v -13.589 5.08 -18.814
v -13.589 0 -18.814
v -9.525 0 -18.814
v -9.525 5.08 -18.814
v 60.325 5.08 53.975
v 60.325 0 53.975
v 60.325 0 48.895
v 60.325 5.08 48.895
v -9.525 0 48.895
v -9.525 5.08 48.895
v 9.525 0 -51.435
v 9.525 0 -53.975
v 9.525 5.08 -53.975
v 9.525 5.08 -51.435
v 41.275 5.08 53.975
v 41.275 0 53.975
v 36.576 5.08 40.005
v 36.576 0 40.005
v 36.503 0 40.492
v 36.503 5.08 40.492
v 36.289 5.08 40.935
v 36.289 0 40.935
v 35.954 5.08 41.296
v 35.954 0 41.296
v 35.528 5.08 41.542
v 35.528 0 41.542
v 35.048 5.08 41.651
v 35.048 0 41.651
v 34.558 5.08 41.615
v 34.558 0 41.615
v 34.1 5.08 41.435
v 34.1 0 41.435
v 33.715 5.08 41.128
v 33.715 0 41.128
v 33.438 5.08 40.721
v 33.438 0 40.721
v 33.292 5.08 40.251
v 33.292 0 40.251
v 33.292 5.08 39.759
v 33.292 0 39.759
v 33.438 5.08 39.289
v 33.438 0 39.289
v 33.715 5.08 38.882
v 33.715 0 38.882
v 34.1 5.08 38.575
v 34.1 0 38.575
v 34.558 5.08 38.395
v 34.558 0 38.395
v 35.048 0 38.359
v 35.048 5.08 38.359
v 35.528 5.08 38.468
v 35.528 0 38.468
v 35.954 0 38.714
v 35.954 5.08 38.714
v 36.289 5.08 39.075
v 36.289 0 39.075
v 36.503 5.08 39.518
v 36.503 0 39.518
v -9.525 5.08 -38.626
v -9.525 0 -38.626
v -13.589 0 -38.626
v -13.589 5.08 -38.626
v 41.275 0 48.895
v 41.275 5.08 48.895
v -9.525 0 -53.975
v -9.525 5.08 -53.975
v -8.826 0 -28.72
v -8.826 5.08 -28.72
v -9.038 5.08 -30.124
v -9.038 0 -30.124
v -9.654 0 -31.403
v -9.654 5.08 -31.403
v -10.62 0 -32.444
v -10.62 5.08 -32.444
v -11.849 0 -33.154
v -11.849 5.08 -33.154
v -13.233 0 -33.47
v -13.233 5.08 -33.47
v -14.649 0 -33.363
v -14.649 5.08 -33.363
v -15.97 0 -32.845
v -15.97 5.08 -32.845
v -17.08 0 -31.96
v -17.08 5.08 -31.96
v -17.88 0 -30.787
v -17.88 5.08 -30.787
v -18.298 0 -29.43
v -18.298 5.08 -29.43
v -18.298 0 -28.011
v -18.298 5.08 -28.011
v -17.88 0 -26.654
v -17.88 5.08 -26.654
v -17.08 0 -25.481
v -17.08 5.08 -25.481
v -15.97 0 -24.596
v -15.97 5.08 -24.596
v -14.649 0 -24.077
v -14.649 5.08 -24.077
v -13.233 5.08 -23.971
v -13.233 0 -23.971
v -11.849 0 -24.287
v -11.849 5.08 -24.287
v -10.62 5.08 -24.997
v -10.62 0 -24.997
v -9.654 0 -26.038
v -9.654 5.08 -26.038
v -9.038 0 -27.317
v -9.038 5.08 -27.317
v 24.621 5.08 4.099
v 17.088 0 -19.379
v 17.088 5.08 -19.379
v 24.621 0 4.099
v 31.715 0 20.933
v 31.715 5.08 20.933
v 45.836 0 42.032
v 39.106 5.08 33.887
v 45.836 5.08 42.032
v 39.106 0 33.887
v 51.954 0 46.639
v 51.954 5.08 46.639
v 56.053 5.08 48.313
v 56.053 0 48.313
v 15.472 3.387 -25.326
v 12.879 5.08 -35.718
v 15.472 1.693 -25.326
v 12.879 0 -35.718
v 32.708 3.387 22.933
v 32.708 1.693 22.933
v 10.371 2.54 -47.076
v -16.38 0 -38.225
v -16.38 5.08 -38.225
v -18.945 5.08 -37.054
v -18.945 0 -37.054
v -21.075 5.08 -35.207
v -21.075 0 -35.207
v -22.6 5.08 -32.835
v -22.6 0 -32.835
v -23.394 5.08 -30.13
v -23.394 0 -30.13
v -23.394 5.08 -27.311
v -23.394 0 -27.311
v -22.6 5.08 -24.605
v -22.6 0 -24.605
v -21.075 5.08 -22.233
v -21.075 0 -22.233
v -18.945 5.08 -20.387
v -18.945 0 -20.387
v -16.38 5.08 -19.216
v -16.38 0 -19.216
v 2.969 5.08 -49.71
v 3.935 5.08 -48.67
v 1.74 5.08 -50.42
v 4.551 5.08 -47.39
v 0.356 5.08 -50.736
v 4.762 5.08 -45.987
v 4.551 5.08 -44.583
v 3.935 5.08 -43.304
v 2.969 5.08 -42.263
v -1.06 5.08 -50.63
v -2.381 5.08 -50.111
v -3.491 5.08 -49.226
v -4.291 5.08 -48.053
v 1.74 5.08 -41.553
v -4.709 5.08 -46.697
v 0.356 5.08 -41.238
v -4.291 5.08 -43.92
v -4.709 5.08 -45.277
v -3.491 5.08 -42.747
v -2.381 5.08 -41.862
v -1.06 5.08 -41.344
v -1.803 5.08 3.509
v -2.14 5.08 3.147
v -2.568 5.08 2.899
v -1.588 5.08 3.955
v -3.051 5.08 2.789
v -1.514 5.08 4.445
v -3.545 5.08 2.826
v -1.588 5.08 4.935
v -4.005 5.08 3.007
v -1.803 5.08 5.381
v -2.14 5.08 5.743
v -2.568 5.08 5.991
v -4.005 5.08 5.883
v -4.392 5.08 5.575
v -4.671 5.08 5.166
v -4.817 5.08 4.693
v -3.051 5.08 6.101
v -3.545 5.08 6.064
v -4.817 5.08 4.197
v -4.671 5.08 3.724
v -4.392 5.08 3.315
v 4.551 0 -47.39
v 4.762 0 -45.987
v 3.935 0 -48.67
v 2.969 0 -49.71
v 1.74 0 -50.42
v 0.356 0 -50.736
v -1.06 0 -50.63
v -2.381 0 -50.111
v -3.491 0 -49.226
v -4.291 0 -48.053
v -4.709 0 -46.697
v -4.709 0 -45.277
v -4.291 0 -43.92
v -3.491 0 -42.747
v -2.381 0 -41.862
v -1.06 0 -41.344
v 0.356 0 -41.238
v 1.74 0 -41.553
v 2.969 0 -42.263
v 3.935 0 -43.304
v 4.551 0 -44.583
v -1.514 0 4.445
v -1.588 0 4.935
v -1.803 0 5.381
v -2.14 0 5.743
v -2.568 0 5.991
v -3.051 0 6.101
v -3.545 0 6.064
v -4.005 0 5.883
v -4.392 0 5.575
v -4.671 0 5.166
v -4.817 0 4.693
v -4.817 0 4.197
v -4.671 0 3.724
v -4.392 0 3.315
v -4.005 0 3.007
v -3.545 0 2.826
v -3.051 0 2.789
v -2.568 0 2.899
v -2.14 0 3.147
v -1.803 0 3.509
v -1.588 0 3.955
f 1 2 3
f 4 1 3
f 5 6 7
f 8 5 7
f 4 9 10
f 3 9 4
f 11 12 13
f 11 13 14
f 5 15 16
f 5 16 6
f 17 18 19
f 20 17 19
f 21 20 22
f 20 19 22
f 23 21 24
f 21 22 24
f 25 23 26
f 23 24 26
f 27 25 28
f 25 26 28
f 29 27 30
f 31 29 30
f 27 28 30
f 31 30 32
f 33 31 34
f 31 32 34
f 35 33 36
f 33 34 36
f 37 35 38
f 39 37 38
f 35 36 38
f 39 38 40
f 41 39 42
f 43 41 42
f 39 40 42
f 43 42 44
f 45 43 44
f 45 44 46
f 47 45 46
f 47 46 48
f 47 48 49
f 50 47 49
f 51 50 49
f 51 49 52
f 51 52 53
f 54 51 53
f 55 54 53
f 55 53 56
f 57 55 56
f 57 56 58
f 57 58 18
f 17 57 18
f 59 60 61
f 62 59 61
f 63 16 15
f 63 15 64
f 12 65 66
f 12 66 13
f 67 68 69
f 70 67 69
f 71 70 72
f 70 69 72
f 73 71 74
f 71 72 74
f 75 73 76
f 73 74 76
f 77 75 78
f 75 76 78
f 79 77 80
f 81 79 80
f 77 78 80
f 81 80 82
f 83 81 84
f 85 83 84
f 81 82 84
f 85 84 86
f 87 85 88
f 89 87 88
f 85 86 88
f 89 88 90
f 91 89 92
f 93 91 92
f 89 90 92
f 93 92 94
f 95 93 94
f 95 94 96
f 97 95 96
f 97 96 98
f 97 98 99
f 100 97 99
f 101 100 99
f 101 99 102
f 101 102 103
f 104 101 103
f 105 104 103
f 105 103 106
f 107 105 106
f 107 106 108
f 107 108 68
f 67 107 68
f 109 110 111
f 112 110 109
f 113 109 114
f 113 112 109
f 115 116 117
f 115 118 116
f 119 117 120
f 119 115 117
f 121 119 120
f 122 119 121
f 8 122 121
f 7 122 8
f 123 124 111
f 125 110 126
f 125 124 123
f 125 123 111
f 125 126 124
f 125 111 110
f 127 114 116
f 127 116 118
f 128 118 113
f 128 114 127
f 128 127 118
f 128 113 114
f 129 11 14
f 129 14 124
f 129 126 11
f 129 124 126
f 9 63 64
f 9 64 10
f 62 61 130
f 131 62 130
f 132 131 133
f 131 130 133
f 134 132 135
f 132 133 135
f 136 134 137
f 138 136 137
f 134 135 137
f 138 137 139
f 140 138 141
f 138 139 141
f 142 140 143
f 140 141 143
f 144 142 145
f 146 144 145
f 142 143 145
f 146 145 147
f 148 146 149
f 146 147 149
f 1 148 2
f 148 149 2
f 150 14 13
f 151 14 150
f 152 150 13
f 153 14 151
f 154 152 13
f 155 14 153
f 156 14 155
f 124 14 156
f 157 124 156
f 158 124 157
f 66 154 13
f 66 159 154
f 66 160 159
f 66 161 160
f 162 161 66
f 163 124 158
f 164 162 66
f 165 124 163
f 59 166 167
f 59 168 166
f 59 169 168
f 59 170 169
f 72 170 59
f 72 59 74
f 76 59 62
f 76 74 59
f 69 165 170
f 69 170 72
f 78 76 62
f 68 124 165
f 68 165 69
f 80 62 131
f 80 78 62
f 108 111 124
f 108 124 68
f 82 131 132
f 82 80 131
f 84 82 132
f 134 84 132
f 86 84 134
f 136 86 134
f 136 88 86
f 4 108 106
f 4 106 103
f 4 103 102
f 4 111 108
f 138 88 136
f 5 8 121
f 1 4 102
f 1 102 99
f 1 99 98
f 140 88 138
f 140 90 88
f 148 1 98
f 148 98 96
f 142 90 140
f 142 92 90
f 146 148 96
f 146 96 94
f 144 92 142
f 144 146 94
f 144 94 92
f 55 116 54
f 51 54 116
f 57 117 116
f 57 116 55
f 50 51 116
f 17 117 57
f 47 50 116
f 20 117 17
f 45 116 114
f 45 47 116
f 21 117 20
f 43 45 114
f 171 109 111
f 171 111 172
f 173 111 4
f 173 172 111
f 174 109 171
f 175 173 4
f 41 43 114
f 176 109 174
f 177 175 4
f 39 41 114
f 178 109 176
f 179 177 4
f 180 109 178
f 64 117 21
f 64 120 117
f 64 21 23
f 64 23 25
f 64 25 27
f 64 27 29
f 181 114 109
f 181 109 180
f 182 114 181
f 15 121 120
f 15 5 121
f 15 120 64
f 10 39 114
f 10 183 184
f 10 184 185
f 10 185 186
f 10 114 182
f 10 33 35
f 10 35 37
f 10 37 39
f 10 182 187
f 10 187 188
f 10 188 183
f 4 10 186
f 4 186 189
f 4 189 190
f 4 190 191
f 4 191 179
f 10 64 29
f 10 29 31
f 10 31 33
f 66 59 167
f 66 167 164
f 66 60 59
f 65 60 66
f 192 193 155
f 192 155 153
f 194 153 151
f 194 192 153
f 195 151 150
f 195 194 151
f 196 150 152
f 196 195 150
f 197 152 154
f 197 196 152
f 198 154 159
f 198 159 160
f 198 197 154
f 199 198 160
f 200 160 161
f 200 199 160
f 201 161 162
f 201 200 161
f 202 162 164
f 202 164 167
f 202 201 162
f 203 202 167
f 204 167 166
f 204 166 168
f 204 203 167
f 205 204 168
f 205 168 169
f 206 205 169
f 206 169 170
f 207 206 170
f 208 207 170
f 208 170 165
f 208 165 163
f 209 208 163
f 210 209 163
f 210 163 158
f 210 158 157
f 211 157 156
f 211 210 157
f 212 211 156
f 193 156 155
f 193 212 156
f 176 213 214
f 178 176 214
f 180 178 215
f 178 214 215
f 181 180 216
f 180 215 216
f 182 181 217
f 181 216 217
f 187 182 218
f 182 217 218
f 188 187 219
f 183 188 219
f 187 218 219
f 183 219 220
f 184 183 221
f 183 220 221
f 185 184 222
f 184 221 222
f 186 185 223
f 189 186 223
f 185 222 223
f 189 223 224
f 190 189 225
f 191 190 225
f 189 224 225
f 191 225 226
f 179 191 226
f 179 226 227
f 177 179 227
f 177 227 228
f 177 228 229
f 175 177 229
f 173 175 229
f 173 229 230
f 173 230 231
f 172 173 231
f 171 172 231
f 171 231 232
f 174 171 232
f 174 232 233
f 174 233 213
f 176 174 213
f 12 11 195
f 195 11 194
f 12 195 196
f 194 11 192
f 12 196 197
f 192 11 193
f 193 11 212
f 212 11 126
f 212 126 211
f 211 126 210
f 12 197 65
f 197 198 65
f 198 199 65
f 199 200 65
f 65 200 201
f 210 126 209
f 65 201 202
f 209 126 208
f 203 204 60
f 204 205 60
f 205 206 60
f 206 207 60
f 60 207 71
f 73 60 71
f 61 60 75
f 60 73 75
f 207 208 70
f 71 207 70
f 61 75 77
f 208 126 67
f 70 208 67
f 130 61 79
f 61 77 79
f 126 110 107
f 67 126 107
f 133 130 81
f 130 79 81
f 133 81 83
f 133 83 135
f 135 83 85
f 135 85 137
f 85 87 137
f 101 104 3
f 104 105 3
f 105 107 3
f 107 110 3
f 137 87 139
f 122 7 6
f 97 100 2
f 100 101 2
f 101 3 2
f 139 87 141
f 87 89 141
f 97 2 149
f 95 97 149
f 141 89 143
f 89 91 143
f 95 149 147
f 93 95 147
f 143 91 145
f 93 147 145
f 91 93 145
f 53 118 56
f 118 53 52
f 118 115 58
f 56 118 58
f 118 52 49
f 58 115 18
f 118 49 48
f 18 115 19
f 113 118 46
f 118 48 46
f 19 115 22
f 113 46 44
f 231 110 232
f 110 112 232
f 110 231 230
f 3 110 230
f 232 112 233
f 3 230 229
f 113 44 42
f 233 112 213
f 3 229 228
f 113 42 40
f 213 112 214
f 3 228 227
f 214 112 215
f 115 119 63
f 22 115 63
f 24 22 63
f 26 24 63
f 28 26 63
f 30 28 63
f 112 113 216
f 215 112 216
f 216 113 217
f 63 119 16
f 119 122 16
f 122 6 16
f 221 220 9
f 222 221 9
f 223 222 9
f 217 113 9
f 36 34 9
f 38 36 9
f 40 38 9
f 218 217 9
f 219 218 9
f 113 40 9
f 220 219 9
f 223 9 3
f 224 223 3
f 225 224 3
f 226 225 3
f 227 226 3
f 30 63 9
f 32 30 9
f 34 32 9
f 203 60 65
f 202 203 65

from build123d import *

# Parameters (mm, degrees)
SKETCH1_R               = 4.7625
BOSS_EXTRUDE1_DEPTH     = 5.08
SKETCH4_W               = 19.05
SKETCH4_H               = 5.08
BOSS_EXTRUDE2_DEPTH     = 5.08
SKETCH5_R               = 1.651
SKETCH5_R_2             = 1.660728382
CUT_EXTRUDE1_DEPTH      = 1.0000001
CUT_EXTRUDE1_DEPTH_BACK = 6.0800001
SKETCH6_R               = 4.7625
BOSS_EXTRUDE3_DEPTH     = 5.08
SKETCH8_R               = 4.7625
CUT_EXTRUDE2_DEPTH      = 6.0800001


with BuildPart() as part:
    # Sketch1 → Boss-Extrude1 (new body)
    with BuildSketch(Plane(origin=(0, 0, 0), x_dir=(1, 0, 0), z_dir=(0, 1, 0))):
        with BuildLine():
            Line((-9.525, 53.975), (9.525, 53.975))
            Line((9.525, 53.975), (9.525, 51.435))
            add(Edge.make_bspline(
                [(9.525, 51.435), (9.525, 51.21454564), (27.819109584, -48.895), (60.325, -48.895)],
                knots=[0, 0, 0, 0, 1, 1, 1, 1], degree=3))
            Line((60.325, -48.895), (-9.525, -48.895))
            Line((-9.525, -48.895), (-9.525, 53.975))
        make_face()
        with Locations((0, 45.9867)):
            Circle(SKETCH1_R, mode=Mode.SUBTRACT)
    extrude(amount=BOSS_EXTRUDE1_DEPTH)

    # Sketch4 → Boss-Extrude2 (add)
    with BuildSketch(Plane(origin=(0, 5.08, 0), x_dir=(1, 0, 0), z_dir=(0, 1, 0))):
        with Locations((50.8, -51.435)):
            Rectangle(SKETCH4_W, SKETCH4_H)
    extrude(amount=-BOSS_EXTRUDE2_DEPTH)

    # Sketch5 → Cut-Extrude1 (cut, two sides)
    with BuildSketch(Plane.XZ) as cut_extrude1_sk:
        with Locations((34.925, 40.005)):
            Circle(SKETCH5_R)
        with Locations((-3.175, 4.445)):
            Circle(SKETCH5_R_2)
    extrude(amount=CUT_EXTRUDE1_DEPTH, mode=Mode.SUBTRACT)
    extrude(cut_extrude1_sk.sketch, amount=-CUT_EXTRUDE1_DEPTH_BACK, mode=Mode.SUBTRACT)

    # Sketch6 → Boss-Extrude3 (add)
    with BuildSketch(Plane.XZ):
        with BuildLine():
            Line((-13.589, -18.81432439), (-9.525, -18.81432439))
            Line((-9.525, -18.81432439), (-9.525, -19.686347414))
            ThreePointArc((-9.525, -19.686347414), (-3.683, -28.72032439), (-9.525, -37.754301365))
            Line((-9.525, -37.754301365), (-9.525, -38.62632439))
            Line((-9.525, -38.62632439), (-13.589, -38.62632439))
            ThreePointArc((-13.589, -38.62632439), (-23.495, -28.72032439), (-13.589, -18.81432439))
        make_face()
        with Locations((-13.589, -28.72032439)):
            Circle(SKETCH6_R, mode=Mode.SUBTRACT)
    extrude(amount=-BOSS_EXTRUDE3_DEPTH)

    # Sketch8 → Cut-Extrude2 (cut, through all)
    with BuildSketch(Plane(origin=(0, 5.08, 0), x_dir=(1, 0, 0), z_dir=(0, 1, 0))):
        with Locations((-13.589, 28.72032439)):
            Circle(SKETCH8_R)
    extrude(amount=-CUT_EXTRUDE2_DEPTH, mode=Mode.SUBTRACT)


solid = part.part
